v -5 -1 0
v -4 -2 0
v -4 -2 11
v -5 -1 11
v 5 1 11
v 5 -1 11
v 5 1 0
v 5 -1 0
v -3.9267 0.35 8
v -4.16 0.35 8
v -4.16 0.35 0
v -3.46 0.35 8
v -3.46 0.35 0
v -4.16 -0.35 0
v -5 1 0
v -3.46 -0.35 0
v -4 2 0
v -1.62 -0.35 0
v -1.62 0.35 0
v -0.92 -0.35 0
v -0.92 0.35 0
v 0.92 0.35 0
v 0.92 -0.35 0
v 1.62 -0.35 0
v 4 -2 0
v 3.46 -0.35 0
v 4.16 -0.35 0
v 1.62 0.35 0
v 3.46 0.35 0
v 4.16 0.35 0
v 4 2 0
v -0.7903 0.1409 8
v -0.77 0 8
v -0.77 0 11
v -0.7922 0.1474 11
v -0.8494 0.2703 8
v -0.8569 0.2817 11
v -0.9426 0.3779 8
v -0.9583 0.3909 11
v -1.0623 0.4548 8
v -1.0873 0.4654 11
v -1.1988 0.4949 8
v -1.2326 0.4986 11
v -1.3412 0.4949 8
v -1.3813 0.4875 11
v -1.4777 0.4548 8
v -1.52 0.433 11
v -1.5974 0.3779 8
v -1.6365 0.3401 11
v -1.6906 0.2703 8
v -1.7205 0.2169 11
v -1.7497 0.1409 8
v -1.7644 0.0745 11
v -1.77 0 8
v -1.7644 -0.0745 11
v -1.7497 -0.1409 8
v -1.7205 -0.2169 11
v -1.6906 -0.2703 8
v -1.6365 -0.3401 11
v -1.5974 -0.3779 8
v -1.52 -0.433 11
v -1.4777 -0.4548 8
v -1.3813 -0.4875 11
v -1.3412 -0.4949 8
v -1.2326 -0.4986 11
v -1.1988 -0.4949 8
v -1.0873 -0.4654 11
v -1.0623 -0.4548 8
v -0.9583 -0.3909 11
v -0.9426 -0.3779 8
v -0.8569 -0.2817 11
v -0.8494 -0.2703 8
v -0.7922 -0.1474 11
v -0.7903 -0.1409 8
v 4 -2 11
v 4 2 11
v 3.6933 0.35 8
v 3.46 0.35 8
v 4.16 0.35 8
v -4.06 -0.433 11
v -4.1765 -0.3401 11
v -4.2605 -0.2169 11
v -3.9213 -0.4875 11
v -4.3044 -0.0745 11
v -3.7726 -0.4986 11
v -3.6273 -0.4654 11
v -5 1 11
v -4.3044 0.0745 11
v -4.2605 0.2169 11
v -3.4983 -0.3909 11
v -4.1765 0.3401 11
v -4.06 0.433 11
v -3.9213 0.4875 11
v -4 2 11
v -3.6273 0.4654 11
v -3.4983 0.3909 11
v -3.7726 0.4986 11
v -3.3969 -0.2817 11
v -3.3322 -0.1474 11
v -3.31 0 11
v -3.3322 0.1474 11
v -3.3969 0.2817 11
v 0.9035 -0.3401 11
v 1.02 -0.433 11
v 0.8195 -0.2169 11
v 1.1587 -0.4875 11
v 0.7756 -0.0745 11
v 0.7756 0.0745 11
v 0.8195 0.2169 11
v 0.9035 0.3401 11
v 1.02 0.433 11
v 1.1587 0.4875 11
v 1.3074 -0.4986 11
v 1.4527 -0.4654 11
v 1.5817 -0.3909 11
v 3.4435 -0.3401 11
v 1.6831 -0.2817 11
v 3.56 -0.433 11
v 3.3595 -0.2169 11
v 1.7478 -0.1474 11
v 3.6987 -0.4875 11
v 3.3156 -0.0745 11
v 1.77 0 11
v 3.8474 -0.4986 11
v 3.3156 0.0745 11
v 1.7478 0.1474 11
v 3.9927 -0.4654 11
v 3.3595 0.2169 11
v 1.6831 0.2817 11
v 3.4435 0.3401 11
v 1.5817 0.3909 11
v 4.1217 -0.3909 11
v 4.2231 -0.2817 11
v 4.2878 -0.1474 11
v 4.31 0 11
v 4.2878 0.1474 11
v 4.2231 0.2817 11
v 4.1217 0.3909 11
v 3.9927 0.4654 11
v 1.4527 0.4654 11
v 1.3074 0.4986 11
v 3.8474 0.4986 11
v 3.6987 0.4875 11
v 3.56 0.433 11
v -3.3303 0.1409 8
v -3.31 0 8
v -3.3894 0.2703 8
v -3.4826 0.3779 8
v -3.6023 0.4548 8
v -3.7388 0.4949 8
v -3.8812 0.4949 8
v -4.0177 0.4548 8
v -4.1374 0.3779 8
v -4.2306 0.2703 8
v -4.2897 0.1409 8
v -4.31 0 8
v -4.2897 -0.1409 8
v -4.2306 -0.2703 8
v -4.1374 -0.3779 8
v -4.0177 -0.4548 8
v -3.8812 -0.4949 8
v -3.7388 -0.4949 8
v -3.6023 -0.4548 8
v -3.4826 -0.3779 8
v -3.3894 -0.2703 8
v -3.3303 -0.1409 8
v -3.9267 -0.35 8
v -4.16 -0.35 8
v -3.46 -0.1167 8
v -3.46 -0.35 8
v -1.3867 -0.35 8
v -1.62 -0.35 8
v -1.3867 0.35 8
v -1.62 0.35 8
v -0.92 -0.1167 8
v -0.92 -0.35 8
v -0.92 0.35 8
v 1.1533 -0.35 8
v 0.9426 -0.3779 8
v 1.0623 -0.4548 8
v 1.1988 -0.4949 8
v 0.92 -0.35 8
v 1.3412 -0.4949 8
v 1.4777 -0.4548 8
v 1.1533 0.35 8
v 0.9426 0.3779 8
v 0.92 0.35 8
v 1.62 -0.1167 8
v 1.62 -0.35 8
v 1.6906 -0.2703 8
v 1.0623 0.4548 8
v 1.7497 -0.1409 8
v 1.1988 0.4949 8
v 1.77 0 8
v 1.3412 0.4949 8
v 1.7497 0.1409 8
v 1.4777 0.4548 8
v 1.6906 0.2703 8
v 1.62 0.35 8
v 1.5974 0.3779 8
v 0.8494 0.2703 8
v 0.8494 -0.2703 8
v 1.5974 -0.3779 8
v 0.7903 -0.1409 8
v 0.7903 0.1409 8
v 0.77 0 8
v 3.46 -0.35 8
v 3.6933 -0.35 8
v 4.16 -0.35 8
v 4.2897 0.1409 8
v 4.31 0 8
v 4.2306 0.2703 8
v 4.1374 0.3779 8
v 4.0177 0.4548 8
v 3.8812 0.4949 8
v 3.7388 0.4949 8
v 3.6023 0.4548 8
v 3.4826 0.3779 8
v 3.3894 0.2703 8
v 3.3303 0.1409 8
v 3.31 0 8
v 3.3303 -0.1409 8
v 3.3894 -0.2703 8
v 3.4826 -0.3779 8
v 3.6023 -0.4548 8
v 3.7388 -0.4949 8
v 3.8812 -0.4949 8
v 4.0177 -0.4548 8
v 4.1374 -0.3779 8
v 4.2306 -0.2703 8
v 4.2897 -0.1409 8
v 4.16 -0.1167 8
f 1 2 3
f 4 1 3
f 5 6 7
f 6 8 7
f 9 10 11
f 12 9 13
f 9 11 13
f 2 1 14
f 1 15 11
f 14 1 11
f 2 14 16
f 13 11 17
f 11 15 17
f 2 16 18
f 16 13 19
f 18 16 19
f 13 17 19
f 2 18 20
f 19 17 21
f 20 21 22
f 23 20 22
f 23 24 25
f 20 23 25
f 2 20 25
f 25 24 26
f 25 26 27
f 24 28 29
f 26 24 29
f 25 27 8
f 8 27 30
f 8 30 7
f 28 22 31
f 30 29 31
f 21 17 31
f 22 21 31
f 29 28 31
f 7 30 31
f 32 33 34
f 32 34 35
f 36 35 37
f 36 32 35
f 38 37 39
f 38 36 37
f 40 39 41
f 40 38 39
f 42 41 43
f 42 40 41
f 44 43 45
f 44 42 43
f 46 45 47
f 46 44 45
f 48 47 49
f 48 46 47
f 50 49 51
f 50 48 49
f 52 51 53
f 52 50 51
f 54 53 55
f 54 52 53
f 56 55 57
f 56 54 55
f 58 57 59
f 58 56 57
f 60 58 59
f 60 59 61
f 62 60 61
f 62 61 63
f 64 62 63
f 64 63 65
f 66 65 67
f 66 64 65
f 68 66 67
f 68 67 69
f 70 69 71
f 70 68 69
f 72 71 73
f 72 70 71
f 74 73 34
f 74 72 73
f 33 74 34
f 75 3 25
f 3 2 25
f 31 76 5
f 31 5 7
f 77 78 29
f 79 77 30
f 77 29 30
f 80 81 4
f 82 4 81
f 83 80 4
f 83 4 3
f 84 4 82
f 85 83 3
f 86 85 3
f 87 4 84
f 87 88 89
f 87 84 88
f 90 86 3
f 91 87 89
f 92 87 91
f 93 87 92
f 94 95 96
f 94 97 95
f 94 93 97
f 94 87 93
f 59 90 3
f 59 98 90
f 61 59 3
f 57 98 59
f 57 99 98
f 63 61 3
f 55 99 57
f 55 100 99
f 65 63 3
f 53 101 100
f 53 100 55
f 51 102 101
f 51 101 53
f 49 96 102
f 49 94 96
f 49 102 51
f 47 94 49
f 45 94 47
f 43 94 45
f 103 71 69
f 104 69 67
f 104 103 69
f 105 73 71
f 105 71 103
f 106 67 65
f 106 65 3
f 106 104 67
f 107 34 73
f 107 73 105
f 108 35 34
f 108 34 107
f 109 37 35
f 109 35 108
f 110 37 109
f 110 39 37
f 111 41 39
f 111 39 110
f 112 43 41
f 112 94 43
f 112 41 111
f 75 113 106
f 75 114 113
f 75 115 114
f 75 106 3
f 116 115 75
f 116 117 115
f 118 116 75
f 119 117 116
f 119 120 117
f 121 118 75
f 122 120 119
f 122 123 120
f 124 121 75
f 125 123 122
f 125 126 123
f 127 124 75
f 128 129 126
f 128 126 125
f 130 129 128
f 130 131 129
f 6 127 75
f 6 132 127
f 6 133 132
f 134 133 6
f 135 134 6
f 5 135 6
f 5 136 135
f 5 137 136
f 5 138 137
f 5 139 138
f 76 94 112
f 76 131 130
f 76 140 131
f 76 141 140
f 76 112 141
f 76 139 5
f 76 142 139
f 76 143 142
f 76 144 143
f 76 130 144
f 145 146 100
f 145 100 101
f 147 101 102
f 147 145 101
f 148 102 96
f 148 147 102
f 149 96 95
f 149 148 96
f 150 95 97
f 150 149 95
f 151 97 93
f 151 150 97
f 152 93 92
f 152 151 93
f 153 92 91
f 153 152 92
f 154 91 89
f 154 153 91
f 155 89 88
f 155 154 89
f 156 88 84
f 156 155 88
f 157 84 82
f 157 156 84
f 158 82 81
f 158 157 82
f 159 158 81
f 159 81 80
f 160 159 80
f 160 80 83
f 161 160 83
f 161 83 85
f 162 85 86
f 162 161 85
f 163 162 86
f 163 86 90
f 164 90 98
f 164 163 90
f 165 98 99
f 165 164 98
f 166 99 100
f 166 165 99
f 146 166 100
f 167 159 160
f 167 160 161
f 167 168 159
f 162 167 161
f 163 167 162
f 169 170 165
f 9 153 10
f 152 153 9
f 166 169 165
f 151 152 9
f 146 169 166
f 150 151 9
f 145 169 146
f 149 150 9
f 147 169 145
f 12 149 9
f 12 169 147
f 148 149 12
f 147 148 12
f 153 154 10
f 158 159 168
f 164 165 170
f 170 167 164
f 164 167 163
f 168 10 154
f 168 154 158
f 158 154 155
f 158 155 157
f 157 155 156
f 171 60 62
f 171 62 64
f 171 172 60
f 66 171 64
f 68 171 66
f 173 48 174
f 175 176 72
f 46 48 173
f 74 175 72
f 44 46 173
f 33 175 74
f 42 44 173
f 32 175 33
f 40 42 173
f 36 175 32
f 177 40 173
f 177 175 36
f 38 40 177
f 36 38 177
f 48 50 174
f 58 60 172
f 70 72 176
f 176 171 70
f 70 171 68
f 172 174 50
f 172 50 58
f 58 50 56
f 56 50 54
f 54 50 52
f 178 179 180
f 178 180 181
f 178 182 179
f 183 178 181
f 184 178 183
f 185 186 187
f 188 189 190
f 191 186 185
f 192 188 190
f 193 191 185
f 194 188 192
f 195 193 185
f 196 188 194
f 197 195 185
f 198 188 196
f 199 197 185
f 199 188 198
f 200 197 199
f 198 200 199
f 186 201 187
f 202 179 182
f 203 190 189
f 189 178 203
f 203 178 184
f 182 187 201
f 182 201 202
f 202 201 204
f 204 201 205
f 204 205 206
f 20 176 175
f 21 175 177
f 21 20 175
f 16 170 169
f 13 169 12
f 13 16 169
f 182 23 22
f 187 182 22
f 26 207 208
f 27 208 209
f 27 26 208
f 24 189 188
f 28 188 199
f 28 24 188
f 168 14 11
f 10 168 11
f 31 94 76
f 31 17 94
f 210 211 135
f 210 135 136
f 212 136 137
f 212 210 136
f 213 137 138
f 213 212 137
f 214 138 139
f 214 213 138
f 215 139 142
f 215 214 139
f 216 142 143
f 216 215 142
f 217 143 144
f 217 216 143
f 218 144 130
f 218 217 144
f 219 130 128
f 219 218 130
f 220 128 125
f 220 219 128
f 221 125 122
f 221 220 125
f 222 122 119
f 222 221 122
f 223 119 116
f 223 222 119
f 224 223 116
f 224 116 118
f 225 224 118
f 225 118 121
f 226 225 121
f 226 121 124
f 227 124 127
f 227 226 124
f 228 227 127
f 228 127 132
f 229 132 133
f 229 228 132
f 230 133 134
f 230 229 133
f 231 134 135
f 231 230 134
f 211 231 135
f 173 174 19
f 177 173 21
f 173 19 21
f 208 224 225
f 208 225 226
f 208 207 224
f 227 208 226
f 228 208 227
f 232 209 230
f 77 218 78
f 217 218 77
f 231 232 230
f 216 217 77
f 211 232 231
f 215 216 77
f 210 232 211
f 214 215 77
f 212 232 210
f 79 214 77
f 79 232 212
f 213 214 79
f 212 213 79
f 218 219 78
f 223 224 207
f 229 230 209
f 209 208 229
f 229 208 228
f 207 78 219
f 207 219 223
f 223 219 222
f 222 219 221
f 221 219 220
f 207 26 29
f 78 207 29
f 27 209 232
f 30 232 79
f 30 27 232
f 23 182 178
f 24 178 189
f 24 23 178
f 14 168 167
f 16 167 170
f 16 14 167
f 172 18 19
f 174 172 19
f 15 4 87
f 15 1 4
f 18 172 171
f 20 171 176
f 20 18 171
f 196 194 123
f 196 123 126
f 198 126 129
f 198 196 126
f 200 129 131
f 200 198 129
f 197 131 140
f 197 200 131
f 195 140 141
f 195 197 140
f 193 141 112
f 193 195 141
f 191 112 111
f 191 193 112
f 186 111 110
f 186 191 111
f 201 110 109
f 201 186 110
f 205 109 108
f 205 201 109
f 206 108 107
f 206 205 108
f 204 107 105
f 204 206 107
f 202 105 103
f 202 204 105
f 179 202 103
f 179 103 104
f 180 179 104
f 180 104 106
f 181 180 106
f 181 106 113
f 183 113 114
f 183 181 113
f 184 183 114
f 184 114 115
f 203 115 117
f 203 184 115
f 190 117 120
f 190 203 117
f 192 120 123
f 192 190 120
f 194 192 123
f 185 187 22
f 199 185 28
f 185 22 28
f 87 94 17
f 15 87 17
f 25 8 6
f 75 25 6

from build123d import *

# Parameters (mm, degrees)
SKETCH_5_W      = 10
SKETCH_5_H      = 4
SKETCH_5_W_2    = 0.7
SKETCH_5_H_2    = 0.7
EXTRUDE_2_DEPTH = 8
SKETCH_6_W      = 10
SKETCH_6_H      = 4
SKETCH_6_R      = 0.5
EXTRUDE_3_DEPTH = 3
CHAMFER_3_SIZE  = 1


with BuildPart() as part:
    # Эскиз5 → Бобышка-Вытянуть2 (new body)
    with BuildSketch(Plane.XY):
        Rectangle(SKETCH_5_W, SKETCH_5_H)
        with Locations((-3.81, 0)):
            Rectangle(SKETCH_5_W_2, SKETCH_5_H_2, mode=Mode.SUBTRACT)
        with Locations((3.81, 0)):
            Rectangle(SKETCH_5_W_2, SKETCH_5_H_2, mode=Mode.SUBTRACT)
        with Locations((-1.27, 0)):
            Rectangle(SKETCH_5_W_2, SKETCH_5_H_2, mode=Mode.SUBTRACT)
        with Locations((1.27, 0)):
            Rectangle(SKETCH_5_W_2, SKETCH_5_H_2, mode=Mode.SUBTRACT)
    extrude(amount=EXTRUDE_2_DEPTH)

    # Эскиз6 → Бобышка-Вытянуть3 (add)
    with BuildSketch(Plane.XY.offset(8)):
        Rectangle(SKETCH_6_W, SKETCH_6_H)
        with Locations((-3.81, 0)):
            Circle(SKETCH_6_R, mode=Mode.SUBTRACT)
        with Locations((-1.27, 0)):
            Circle(SKETCH_6_R, mode=Mode.SUBTRACT)
        with Locations((1.27, 0)):
            Circle(SKETCH_6_R, mode=Mode.SUBTRACT)
        with Locations((3.81, 0)):
            Circle(SKETCH_6_R, mode=Mode.SUBTRACT)
    extrude(amount=EXTRUDE_3_DEPTH)

    # Фаска3
    chamfer_3_edges = [part.edges().sort_by_distance(p)[0] for p in [
        (5, -2, 5.5),
        (-5, -2, 5.5),
        (-5, 2, 5.5),
        (5, 2, 5.5),
    ]]
    chamfer(chamfer_3_edges, length=CHAMFER_3_SIZE)


solid = part.part
